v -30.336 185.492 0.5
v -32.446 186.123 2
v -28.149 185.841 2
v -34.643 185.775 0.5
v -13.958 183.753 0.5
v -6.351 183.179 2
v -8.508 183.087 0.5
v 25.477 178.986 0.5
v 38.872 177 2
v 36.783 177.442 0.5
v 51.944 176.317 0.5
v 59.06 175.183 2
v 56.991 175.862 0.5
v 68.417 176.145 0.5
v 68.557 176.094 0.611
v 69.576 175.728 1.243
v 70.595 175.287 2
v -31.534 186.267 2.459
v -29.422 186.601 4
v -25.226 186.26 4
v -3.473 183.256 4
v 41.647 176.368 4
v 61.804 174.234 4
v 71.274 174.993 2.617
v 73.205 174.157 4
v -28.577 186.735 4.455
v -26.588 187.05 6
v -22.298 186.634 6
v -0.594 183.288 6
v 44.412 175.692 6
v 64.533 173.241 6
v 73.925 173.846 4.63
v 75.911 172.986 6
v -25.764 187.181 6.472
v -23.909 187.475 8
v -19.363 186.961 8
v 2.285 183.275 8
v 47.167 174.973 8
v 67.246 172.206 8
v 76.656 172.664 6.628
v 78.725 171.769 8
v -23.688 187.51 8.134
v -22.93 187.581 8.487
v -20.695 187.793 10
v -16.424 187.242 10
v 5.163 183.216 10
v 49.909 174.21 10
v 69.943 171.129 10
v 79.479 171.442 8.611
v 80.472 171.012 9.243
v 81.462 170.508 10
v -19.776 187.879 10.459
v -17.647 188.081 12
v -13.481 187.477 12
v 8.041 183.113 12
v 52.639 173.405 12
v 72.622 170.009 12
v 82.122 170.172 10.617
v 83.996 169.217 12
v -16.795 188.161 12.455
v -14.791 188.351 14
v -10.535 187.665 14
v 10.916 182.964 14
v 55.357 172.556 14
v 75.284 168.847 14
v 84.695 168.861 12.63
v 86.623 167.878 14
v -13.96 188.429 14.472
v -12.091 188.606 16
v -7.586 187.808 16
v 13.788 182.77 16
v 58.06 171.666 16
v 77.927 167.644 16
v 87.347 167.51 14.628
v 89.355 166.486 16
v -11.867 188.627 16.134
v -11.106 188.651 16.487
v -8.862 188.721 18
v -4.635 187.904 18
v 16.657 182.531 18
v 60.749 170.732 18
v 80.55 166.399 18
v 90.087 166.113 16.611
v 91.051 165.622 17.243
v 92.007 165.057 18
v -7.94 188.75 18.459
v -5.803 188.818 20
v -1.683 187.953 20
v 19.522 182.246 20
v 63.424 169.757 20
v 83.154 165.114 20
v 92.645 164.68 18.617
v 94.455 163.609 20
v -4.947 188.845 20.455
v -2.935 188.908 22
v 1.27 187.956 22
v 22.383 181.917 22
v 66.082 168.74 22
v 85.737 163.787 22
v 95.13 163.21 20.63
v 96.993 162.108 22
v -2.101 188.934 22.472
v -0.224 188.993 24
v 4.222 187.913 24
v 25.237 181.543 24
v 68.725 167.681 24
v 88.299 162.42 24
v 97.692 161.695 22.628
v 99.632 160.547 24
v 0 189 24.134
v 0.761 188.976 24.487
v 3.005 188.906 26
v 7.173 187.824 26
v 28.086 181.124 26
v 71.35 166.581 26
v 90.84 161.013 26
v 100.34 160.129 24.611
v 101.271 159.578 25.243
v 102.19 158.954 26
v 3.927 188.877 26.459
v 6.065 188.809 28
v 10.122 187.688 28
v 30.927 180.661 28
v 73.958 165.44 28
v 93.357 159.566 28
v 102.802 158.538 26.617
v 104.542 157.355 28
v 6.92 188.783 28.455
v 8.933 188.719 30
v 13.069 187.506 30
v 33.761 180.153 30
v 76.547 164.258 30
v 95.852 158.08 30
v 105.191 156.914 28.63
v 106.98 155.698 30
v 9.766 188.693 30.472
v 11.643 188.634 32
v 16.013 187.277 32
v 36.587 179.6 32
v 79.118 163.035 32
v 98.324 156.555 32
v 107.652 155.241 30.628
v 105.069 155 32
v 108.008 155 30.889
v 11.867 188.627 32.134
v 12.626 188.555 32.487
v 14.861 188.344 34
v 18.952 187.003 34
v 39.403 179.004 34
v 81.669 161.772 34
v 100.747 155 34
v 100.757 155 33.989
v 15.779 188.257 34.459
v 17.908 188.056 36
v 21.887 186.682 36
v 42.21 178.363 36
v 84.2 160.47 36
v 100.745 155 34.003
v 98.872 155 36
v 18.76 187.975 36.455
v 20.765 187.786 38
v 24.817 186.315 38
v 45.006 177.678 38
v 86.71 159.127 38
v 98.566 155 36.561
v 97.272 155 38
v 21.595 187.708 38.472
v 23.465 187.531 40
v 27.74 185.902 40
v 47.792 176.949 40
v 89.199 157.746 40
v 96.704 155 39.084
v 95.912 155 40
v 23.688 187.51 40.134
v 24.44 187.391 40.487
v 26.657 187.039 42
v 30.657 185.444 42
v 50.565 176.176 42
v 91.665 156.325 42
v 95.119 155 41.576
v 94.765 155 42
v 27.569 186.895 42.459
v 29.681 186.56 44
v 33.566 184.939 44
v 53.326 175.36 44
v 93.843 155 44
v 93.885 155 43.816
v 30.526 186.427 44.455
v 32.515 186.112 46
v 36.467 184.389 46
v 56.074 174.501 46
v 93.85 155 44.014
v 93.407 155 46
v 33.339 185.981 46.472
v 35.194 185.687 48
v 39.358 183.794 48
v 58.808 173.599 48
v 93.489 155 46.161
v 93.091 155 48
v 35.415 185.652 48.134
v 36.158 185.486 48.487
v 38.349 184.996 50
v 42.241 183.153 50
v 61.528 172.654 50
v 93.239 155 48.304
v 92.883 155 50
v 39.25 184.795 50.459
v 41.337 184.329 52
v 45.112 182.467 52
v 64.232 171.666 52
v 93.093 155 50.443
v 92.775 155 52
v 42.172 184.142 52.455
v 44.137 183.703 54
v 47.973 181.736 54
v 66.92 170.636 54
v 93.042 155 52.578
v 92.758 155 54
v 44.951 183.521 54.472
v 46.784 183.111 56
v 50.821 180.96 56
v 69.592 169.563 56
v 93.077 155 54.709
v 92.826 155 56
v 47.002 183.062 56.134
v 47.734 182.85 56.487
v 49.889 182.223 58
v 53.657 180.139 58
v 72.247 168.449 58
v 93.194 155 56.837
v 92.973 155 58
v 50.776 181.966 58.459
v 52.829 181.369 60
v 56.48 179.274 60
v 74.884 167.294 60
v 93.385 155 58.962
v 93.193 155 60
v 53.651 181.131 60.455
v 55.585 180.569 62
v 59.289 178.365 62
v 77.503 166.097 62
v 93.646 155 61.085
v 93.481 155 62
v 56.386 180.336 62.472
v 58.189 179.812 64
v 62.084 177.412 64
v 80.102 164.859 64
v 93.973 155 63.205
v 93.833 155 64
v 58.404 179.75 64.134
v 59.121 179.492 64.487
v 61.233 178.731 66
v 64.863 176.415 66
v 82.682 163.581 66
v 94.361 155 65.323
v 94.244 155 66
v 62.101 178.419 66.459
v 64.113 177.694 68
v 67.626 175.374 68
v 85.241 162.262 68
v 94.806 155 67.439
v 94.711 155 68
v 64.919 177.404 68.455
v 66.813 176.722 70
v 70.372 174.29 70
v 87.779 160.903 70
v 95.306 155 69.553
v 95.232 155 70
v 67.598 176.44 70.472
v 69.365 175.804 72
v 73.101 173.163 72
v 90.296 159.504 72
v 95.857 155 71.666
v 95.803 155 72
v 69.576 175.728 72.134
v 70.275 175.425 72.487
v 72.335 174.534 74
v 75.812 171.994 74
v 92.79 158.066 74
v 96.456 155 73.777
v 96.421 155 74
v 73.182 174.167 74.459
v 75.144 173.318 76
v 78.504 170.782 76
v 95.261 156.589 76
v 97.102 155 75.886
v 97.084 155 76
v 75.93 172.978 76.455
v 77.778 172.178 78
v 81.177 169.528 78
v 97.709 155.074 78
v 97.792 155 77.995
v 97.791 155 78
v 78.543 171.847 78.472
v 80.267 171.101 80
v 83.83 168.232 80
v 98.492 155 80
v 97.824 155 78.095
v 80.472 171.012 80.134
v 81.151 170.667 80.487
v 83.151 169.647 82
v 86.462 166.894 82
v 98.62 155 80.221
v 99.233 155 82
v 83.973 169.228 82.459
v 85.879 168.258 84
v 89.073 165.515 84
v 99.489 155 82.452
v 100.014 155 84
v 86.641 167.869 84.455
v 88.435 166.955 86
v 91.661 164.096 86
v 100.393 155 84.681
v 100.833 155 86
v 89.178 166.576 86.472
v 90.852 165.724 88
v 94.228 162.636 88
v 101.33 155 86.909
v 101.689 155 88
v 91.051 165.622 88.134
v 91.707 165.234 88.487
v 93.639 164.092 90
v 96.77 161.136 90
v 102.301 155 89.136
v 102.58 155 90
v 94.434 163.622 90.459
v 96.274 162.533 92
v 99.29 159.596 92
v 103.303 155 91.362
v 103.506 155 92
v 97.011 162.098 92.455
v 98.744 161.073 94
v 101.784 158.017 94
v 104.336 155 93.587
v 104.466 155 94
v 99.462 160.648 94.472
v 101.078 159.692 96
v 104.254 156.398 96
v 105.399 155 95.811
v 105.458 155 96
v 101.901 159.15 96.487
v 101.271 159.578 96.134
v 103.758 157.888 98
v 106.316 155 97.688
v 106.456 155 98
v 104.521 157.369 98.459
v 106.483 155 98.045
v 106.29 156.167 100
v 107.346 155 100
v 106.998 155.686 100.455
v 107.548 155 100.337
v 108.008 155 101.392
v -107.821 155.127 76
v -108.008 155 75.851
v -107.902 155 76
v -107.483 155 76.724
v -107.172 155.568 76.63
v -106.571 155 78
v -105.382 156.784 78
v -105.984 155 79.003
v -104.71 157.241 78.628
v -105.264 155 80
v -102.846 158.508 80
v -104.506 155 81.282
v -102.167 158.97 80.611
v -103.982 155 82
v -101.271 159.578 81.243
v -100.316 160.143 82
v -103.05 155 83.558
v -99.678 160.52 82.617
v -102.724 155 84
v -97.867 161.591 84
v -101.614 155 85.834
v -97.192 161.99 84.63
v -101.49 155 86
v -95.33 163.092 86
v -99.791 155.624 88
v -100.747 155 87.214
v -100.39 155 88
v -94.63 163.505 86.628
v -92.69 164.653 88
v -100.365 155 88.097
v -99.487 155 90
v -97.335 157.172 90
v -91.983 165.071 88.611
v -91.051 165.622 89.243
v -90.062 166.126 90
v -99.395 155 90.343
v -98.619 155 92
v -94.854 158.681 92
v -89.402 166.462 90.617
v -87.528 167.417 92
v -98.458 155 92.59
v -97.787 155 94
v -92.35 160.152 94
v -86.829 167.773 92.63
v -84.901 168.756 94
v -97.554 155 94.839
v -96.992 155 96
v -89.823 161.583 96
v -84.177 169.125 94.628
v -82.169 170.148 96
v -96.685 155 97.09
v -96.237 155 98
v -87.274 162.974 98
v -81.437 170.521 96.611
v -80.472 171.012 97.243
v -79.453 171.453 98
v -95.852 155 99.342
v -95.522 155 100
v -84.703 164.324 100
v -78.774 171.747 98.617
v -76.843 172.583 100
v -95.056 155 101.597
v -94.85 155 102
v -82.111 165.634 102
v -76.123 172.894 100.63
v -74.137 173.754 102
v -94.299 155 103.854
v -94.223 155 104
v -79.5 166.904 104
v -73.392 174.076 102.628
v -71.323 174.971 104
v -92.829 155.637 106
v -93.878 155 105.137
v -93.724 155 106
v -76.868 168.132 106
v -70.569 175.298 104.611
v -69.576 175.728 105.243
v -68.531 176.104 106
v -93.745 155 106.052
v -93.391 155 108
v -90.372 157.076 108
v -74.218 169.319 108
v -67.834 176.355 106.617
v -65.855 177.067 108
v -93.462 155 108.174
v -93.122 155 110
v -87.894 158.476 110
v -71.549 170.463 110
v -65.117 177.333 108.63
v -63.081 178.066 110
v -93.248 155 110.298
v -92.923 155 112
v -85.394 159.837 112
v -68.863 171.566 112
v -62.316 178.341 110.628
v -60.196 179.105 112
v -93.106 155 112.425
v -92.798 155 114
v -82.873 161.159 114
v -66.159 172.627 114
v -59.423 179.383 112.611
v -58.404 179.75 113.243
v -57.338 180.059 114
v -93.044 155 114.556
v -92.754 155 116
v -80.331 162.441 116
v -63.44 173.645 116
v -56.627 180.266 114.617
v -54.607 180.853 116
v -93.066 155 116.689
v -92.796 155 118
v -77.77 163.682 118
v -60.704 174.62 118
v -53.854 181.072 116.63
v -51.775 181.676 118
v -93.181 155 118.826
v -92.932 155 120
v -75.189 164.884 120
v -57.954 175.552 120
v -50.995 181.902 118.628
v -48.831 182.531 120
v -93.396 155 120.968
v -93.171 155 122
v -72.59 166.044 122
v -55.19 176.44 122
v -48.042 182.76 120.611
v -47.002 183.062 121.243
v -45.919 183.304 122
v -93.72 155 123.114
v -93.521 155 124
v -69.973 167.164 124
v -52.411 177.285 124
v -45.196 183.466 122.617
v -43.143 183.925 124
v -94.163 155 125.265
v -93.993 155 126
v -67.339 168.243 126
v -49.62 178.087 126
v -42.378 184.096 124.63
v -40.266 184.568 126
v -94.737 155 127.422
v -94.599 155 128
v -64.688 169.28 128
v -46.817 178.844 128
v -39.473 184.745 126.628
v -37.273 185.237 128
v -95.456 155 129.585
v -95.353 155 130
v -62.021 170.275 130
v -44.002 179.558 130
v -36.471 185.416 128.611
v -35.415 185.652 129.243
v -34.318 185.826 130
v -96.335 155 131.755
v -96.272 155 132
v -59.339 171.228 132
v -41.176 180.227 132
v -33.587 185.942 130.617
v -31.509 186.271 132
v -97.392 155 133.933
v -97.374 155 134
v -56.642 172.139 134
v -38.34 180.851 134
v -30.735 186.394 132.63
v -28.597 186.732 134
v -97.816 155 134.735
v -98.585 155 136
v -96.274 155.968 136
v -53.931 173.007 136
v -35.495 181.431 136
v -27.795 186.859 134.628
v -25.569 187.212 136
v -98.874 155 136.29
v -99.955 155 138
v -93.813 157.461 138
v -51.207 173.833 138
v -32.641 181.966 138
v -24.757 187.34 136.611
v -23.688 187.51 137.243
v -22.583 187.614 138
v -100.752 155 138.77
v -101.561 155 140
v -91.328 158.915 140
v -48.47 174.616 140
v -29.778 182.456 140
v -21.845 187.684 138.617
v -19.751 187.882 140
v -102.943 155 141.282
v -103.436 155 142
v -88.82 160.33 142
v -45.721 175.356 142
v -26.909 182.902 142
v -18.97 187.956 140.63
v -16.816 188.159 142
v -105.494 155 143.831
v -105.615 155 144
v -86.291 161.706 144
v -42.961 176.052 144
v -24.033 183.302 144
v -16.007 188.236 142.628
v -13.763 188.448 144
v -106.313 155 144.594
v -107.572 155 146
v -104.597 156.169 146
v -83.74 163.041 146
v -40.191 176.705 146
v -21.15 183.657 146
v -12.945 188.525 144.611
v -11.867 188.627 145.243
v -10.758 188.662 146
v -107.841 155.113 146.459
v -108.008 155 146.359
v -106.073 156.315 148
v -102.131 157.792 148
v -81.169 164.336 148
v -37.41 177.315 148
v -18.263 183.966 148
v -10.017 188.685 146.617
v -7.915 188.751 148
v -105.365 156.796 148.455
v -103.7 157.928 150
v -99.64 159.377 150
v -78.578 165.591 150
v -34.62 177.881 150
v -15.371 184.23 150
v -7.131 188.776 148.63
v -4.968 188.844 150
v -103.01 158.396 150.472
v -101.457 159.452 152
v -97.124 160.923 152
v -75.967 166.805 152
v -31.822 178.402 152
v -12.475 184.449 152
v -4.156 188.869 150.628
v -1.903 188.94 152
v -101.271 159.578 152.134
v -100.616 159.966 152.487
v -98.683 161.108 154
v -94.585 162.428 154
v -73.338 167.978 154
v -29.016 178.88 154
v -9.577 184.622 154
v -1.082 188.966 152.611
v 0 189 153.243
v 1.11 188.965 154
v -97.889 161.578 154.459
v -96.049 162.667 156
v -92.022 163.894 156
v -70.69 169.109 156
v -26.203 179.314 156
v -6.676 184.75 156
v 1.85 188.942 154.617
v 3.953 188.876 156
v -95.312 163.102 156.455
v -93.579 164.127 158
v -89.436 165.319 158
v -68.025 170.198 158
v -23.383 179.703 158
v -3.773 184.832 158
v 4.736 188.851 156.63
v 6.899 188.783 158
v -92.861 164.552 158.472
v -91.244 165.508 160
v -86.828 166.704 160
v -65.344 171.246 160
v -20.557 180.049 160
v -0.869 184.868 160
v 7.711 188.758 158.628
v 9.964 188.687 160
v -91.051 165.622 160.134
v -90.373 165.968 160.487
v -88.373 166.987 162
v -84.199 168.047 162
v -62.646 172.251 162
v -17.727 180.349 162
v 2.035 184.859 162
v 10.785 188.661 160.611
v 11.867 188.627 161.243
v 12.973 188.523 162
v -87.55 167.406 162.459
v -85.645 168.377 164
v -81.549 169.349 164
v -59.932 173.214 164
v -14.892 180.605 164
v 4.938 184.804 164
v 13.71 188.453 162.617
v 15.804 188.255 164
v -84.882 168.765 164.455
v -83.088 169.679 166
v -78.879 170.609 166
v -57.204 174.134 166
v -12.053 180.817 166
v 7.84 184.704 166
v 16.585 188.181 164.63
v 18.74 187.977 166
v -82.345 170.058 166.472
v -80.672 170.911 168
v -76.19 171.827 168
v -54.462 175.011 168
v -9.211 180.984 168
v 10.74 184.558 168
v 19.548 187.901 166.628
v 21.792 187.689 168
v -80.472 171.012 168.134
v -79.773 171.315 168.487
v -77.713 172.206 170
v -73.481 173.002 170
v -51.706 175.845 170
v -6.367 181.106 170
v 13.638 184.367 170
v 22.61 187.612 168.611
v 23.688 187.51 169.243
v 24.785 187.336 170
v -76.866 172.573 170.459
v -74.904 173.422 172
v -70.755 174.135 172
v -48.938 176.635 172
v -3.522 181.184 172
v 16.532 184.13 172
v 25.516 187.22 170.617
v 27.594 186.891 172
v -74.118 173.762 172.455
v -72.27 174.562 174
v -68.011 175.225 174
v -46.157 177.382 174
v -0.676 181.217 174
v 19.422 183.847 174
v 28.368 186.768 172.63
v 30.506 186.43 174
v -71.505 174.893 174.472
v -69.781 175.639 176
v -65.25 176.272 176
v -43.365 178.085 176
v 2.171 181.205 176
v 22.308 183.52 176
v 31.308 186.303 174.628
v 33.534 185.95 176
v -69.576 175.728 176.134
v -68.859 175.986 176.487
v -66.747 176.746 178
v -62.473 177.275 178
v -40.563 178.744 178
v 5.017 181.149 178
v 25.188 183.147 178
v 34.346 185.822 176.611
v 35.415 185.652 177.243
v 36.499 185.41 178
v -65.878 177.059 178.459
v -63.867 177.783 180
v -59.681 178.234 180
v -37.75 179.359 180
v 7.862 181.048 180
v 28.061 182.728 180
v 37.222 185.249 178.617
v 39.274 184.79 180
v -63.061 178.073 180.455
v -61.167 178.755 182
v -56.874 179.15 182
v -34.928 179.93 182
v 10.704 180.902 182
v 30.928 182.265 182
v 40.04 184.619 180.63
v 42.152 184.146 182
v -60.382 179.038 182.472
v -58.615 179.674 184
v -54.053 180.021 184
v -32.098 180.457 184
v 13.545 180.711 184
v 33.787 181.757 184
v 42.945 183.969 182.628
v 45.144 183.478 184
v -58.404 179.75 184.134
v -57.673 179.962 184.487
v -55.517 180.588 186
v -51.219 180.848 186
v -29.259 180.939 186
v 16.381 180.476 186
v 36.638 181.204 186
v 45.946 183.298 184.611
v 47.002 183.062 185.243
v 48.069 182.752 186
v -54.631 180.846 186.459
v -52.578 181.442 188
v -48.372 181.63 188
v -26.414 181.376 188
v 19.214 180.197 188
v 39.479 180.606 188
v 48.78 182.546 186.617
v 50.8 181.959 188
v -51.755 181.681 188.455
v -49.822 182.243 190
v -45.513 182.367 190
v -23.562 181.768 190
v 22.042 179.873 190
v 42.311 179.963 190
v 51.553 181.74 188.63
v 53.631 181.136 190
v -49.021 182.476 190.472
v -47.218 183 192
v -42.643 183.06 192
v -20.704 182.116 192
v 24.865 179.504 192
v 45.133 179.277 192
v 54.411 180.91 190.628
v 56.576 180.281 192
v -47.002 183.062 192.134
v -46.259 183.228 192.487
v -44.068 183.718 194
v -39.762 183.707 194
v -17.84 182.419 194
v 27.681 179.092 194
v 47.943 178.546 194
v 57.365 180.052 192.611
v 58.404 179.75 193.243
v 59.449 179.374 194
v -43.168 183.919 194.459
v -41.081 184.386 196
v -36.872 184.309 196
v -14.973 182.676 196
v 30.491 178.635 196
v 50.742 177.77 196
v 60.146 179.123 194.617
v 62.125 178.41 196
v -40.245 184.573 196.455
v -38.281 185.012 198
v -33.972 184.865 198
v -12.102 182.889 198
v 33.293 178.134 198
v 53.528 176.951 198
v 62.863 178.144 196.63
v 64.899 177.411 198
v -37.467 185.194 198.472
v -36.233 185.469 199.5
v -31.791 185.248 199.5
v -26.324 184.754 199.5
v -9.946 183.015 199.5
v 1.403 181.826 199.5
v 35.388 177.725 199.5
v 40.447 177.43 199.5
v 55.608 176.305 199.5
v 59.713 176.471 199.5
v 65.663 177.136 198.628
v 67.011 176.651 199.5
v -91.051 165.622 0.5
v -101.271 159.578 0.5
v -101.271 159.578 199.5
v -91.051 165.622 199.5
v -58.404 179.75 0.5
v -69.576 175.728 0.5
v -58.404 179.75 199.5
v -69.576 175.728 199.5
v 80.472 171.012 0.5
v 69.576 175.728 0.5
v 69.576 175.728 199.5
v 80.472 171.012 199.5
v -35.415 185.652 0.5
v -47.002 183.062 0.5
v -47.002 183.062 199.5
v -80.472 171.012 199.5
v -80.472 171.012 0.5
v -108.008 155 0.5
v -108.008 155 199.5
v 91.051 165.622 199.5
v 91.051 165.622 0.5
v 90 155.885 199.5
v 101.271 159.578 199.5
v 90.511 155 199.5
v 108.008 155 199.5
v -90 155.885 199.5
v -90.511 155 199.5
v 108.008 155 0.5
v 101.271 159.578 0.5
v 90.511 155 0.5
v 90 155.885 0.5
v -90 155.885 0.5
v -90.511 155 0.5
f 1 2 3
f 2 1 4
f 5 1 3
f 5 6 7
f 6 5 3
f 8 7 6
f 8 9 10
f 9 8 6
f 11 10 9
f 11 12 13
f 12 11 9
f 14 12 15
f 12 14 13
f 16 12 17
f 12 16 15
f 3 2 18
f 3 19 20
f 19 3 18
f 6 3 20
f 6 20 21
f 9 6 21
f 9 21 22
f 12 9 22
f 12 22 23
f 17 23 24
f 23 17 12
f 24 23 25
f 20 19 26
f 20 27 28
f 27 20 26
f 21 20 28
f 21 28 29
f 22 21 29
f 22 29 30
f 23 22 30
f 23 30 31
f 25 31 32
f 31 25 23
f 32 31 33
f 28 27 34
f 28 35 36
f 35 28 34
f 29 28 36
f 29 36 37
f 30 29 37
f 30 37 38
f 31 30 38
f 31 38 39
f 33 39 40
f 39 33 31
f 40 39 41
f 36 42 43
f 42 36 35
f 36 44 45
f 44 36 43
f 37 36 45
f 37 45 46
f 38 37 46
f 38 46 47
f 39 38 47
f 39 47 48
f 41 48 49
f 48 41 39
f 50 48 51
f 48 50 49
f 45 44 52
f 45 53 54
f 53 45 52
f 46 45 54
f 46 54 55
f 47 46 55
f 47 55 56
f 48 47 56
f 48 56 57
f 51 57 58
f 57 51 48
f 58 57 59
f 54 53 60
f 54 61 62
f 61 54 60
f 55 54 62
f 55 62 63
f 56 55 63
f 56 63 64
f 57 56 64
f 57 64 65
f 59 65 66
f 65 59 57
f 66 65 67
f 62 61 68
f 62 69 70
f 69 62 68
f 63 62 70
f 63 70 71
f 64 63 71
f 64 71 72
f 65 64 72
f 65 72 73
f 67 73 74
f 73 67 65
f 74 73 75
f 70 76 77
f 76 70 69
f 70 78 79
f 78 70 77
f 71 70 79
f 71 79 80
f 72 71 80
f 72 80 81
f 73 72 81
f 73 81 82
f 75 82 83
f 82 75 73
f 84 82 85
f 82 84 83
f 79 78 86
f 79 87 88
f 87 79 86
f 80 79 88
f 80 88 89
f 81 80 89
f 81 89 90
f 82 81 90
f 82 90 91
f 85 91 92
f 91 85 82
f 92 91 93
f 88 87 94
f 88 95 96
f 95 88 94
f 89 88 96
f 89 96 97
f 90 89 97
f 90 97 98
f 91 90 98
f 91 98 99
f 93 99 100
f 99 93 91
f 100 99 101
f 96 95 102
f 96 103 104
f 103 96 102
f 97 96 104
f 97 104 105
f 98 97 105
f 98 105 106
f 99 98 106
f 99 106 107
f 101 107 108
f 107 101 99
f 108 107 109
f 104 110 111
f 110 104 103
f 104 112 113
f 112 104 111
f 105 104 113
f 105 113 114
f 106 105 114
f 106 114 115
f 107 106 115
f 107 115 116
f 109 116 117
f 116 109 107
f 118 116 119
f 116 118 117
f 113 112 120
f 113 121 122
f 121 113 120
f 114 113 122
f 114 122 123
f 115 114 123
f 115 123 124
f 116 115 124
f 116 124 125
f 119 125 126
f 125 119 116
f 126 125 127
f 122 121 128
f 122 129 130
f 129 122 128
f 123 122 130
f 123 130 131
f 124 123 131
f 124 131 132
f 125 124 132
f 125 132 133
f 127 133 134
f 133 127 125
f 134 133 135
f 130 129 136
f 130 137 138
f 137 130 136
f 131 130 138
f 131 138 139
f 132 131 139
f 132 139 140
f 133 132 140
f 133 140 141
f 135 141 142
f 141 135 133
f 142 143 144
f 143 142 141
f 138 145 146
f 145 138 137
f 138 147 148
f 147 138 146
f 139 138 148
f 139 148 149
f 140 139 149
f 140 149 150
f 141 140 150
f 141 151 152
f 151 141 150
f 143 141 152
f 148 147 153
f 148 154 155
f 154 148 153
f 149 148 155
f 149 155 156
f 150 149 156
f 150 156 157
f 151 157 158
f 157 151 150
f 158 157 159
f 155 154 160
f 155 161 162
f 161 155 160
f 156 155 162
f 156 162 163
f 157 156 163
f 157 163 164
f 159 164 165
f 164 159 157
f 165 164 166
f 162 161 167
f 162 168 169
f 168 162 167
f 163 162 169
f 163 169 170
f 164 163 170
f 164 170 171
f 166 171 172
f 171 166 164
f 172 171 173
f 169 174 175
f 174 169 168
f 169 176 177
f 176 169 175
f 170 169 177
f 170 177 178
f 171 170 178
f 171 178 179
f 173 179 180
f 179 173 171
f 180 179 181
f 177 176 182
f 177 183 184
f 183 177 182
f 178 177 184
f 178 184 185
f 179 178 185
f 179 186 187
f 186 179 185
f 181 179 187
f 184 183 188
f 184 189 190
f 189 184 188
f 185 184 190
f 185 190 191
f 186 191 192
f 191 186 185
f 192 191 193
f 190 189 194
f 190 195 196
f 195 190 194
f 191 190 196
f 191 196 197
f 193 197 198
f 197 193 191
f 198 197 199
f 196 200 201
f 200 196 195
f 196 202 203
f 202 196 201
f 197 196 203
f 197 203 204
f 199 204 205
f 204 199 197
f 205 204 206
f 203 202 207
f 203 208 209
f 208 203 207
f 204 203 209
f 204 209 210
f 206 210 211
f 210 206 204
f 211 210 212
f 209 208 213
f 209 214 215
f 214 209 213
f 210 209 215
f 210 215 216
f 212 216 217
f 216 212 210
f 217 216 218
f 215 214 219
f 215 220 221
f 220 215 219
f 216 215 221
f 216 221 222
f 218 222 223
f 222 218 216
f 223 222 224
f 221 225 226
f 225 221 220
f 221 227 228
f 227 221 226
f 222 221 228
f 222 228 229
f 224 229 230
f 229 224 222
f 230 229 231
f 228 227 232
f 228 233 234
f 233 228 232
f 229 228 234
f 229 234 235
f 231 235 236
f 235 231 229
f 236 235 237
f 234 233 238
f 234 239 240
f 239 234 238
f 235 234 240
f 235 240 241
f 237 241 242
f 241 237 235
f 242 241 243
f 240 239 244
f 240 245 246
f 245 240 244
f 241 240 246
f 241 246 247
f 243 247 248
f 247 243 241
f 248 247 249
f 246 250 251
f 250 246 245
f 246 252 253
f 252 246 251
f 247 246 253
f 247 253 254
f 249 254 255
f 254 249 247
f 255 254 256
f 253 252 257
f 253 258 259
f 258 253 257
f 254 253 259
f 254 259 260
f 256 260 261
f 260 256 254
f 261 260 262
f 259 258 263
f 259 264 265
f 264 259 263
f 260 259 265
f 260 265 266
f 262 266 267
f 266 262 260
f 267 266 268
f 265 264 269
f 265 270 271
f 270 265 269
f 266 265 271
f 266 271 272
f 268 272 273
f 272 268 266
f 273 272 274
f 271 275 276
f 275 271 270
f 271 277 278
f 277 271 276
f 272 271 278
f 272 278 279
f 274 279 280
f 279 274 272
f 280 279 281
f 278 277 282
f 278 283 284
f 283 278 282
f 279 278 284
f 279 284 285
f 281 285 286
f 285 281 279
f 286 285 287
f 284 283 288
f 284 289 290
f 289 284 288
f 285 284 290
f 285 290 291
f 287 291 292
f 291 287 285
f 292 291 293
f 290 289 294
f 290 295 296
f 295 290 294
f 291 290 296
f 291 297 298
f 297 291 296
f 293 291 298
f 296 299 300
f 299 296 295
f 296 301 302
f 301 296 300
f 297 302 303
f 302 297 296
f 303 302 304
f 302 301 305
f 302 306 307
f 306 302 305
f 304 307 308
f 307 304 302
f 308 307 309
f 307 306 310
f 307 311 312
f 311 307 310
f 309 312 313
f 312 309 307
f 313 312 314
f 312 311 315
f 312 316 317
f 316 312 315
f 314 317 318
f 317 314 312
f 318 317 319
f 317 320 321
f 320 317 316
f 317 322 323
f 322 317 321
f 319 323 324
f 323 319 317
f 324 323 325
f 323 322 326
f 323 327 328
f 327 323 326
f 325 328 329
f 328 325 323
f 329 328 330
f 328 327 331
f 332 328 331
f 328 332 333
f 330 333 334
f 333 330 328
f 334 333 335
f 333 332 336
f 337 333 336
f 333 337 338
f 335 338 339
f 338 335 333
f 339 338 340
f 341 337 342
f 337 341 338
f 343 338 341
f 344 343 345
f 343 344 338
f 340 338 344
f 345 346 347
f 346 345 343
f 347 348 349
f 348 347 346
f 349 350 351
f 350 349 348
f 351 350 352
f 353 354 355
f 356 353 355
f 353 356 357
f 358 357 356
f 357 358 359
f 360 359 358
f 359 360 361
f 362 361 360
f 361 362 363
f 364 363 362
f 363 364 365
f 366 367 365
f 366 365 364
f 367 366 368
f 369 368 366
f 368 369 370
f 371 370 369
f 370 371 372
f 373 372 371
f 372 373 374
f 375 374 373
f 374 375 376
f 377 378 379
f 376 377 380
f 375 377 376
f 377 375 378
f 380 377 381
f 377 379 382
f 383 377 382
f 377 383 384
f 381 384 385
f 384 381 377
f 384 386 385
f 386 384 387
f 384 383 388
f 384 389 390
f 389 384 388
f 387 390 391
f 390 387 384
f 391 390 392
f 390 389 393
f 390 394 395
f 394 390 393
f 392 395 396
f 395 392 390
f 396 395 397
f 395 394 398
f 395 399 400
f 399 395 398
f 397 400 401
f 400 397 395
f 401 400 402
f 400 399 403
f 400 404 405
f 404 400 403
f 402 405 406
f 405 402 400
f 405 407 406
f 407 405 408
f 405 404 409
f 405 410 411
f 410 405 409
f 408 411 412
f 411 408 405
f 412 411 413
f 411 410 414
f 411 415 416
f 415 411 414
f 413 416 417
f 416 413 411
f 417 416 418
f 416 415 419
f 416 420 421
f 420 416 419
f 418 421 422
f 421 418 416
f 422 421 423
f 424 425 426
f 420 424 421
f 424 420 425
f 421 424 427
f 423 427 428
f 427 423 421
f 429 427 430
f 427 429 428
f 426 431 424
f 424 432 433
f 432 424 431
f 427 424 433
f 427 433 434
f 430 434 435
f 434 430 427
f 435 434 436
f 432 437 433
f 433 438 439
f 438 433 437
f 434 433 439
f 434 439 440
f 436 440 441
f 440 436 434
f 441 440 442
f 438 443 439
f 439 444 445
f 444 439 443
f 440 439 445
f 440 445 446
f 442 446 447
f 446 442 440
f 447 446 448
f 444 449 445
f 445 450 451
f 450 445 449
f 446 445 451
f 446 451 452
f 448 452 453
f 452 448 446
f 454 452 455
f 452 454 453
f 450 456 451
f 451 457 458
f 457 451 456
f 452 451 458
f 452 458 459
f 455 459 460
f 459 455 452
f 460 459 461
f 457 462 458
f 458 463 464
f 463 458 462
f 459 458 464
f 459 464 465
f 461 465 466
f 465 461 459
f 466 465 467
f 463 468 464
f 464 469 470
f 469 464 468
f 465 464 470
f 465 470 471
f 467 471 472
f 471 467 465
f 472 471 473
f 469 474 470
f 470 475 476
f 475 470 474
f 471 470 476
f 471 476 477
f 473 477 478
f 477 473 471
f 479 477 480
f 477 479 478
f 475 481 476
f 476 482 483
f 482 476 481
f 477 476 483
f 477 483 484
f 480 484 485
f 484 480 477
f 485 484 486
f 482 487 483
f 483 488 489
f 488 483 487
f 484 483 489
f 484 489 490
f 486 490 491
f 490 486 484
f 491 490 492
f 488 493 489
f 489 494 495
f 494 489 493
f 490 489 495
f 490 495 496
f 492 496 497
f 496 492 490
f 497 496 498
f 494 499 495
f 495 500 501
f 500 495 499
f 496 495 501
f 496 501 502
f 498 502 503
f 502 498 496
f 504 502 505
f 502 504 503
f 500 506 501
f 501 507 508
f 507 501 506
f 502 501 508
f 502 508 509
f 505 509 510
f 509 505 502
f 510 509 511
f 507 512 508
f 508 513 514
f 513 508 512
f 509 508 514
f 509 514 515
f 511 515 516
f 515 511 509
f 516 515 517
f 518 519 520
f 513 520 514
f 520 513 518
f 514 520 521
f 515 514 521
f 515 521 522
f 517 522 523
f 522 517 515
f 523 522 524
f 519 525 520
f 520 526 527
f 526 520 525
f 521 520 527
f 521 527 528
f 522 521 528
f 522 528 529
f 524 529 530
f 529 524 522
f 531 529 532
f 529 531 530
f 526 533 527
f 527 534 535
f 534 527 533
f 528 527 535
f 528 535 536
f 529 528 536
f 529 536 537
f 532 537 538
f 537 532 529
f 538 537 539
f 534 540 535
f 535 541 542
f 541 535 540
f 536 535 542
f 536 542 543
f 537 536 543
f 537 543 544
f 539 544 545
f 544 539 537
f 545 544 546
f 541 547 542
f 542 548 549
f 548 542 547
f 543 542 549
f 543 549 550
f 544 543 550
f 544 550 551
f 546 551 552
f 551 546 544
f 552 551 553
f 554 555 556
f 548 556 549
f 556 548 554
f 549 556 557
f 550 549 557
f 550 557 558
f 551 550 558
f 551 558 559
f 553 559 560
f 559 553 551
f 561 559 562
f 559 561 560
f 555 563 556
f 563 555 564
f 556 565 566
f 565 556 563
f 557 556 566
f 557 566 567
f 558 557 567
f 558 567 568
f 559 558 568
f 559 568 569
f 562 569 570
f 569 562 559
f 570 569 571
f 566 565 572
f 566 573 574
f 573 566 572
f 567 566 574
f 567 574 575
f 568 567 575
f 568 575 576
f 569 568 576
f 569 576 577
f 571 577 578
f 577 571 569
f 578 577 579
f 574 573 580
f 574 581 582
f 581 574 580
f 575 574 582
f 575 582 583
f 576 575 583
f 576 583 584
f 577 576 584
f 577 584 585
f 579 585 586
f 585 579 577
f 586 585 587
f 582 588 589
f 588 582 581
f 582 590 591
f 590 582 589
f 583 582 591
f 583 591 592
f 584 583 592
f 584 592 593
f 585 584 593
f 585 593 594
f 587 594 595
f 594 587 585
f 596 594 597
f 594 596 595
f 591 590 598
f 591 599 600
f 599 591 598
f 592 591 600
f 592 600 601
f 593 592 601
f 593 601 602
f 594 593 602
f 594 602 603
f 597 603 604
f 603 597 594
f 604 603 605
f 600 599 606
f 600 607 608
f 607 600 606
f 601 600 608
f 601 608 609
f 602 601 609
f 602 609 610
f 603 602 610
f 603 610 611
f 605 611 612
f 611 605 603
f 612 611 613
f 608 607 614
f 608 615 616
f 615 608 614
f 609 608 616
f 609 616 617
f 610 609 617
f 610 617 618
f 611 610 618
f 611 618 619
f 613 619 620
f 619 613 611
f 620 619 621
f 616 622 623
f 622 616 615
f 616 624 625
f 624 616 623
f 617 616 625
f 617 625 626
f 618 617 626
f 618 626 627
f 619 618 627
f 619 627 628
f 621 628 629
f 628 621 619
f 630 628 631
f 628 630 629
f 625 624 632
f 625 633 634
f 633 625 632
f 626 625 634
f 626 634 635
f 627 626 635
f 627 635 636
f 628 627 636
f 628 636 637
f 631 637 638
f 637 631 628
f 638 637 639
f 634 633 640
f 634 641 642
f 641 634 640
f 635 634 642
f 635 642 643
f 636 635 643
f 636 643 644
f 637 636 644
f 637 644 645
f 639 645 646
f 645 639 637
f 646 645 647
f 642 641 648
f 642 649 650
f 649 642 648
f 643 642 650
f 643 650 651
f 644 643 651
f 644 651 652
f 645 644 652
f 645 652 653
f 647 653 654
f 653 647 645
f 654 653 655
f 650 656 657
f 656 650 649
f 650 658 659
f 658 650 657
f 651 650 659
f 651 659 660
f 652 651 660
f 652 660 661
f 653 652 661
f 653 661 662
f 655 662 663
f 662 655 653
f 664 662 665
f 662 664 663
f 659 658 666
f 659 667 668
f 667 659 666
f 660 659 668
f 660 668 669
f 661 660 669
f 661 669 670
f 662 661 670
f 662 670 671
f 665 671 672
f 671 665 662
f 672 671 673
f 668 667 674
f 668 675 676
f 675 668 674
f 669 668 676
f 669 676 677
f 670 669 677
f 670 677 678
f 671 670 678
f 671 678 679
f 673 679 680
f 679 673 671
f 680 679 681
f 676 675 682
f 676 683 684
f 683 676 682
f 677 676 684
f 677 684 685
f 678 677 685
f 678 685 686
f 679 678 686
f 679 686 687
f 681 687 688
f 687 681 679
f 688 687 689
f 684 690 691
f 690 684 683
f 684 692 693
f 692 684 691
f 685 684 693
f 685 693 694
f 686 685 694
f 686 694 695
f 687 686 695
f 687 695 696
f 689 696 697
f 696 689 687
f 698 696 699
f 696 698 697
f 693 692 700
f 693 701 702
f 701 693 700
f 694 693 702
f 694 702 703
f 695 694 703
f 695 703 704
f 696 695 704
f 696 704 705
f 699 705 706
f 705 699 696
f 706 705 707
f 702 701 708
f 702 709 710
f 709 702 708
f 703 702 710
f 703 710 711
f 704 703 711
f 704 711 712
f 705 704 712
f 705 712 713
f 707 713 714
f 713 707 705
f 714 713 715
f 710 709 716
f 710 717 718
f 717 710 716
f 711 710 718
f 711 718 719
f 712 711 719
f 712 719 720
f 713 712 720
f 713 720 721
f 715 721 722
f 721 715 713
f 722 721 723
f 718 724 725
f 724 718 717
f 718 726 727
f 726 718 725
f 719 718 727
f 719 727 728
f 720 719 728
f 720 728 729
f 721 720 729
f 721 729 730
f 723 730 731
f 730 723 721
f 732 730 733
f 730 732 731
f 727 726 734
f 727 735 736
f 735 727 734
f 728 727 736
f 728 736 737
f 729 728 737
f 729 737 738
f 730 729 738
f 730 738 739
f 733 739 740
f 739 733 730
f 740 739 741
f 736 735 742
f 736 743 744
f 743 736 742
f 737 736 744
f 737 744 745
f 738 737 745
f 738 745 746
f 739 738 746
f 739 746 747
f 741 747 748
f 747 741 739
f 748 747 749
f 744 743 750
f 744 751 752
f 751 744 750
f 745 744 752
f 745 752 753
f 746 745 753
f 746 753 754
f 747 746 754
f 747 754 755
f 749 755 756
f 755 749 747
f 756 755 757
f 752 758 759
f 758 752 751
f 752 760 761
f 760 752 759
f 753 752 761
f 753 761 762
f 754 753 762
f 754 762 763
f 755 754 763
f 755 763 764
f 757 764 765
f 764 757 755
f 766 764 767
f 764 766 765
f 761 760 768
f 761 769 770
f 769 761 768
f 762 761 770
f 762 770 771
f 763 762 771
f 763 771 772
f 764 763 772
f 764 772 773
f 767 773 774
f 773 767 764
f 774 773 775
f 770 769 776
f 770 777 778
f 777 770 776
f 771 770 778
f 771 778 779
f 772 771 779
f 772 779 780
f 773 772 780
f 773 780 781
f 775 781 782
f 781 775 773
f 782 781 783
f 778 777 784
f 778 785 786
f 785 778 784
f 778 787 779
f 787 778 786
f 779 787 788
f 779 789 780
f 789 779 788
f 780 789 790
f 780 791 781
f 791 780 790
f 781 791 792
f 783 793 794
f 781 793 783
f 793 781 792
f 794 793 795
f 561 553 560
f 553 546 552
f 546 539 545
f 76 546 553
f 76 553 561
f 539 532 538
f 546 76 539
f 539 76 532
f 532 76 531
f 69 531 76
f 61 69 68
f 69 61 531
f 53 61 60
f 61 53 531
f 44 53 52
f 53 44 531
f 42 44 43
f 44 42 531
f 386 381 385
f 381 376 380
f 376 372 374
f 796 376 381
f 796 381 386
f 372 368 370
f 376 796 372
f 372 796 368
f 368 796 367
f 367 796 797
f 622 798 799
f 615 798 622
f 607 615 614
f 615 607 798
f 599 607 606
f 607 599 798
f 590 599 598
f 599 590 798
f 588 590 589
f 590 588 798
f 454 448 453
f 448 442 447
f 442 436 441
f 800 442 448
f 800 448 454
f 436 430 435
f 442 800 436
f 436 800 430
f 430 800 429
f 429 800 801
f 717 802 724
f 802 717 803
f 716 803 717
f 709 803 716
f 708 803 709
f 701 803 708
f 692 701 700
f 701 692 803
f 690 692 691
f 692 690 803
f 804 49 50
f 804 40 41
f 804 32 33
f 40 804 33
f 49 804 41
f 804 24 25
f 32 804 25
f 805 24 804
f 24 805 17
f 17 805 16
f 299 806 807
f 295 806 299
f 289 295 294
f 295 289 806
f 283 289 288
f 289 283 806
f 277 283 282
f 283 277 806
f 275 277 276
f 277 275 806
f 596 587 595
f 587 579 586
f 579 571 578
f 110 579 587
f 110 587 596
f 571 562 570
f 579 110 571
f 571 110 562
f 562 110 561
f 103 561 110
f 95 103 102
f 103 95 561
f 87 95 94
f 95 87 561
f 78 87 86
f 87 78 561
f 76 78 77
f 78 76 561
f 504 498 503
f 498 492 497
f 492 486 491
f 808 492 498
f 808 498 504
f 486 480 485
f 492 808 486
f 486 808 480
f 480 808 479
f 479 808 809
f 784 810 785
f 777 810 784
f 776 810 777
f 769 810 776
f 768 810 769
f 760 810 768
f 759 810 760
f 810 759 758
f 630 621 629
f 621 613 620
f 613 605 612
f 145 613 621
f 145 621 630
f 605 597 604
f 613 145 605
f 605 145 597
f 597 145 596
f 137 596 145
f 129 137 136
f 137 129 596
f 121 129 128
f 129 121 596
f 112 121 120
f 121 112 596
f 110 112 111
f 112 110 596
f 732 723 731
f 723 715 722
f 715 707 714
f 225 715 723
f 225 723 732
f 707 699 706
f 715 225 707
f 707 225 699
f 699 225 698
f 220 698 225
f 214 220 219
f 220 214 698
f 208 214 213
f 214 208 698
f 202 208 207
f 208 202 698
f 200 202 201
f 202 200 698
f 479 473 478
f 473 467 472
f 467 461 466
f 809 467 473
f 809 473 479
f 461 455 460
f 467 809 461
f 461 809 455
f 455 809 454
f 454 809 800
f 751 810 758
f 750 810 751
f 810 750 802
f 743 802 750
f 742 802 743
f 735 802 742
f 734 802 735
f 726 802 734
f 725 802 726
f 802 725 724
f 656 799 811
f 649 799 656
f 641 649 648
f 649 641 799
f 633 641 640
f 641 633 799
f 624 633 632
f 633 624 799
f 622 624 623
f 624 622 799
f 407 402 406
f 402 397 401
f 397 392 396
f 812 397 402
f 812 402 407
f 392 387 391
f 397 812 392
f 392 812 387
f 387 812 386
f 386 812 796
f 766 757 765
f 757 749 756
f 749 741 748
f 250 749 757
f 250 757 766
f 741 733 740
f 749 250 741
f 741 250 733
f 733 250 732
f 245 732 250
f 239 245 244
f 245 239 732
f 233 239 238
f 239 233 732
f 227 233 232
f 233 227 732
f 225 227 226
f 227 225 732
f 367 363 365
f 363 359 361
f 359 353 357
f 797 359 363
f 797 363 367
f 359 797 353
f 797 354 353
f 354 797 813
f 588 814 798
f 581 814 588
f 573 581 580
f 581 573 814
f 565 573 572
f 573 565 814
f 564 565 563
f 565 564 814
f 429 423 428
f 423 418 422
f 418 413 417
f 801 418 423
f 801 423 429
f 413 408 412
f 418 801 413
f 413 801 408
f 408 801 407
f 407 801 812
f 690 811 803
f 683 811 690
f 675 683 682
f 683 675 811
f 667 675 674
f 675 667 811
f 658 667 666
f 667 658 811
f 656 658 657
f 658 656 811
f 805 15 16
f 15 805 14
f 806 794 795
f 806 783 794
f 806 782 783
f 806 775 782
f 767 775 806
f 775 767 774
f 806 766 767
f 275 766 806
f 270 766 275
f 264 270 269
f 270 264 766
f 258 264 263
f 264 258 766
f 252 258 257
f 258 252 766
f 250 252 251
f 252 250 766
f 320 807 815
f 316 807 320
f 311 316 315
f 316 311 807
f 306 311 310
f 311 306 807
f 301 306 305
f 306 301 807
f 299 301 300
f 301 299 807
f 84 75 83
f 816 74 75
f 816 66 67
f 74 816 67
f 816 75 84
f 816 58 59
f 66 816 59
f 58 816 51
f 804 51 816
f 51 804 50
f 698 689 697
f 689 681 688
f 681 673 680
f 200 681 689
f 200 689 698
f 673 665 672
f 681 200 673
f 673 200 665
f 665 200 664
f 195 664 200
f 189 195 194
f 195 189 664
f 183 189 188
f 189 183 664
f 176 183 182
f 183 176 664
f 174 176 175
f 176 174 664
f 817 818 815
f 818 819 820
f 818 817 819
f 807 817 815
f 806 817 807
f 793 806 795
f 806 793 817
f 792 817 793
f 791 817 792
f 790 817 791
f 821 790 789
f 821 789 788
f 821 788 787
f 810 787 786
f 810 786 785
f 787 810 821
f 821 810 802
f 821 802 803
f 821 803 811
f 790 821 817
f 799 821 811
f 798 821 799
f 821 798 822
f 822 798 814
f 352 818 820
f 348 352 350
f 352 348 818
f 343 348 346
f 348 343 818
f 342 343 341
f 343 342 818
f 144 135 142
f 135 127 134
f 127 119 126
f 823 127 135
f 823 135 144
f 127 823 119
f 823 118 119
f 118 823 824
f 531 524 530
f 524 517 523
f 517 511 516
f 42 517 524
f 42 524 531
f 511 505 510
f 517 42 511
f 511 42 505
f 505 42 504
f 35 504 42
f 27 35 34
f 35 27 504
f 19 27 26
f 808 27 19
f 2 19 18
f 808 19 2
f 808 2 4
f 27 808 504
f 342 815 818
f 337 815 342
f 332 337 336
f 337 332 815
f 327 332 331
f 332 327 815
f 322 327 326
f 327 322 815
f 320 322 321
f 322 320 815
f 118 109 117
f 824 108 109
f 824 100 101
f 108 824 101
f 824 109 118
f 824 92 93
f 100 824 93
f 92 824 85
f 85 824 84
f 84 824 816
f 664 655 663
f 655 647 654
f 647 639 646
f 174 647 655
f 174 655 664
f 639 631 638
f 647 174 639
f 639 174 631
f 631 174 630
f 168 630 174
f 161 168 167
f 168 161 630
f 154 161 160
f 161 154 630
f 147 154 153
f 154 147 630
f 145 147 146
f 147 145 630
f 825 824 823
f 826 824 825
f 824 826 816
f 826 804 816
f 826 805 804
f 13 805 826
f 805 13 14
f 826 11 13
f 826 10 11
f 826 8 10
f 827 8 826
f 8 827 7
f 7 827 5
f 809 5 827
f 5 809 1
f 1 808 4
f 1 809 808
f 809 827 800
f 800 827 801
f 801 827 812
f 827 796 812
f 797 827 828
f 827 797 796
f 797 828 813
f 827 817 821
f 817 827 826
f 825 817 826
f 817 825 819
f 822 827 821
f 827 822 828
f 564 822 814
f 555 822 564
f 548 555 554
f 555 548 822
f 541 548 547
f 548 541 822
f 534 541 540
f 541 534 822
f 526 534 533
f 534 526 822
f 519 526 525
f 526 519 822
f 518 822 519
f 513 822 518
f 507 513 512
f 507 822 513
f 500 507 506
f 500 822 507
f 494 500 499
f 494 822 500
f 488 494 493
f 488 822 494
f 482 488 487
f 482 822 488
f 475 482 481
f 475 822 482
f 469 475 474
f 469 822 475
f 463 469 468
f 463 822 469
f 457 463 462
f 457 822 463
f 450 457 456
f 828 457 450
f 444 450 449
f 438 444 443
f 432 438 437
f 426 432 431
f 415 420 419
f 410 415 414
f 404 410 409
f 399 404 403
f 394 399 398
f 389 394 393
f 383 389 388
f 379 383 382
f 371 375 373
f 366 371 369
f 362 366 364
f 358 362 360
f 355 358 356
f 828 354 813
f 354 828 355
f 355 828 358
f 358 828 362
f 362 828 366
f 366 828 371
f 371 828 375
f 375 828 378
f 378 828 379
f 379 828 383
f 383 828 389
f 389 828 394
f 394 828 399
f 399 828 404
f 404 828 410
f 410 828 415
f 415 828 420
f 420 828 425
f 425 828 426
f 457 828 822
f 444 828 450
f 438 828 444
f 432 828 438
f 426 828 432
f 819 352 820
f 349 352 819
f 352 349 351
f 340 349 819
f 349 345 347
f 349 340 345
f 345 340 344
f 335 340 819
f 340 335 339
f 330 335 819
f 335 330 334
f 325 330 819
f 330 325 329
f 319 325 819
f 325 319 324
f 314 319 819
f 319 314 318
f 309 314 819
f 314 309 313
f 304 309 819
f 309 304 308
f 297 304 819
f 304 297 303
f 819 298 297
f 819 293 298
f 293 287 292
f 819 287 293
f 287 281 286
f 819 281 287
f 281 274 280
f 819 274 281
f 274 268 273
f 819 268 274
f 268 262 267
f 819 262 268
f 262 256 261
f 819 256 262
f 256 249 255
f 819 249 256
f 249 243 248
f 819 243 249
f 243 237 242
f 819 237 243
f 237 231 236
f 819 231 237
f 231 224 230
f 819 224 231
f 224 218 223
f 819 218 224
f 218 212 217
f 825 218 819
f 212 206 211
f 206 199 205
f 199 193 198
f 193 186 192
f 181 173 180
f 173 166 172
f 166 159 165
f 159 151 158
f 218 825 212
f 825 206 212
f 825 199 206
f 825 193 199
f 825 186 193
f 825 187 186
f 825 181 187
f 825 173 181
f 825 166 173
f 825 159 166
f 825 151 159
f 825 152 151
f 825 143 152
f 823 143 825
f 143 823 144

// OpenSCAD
intersection() {
difference() {
translate([0,0,100]) {cylinder (r = 189, h = 199, $fn = 100, center = true);}

union() {
linear_extrude(height = 200, twist = 90, $fn = 400) translate([-50,-100,0]){import(file = "wing.dxf", center = false, $fn = 100);} rotate([0,30,0]);

rotate([0,0,90]) {linear_extrude(height = 200, twist = 90, $fn = 400) translate([-50,-100,0]){import(file = "wing.dxf", center = false, $fn = 100);} rotate([0,30,0]);}

rotate([0,0,180]) {linear_extrude(height = 200, twist = 90, $fn = 400) translate([-50,-100,0]){import(file = "wing.dxf", center = false, $fn = 100);} rotate([0,30,0]);}

rotate([0,0,270]) {linear_extrude(height = 200, twist = 90, $fn = 400) translate([-50,-100,0]){import(file = "wing.dxf", center = false, $fn = 100);} rotate([0,30,0]);}
}
cylinder(h = 400, r = 180, center = true, $fn = 6);
}


translate ([0,175,100]){cube ([400,40,200], center = true);}
}
